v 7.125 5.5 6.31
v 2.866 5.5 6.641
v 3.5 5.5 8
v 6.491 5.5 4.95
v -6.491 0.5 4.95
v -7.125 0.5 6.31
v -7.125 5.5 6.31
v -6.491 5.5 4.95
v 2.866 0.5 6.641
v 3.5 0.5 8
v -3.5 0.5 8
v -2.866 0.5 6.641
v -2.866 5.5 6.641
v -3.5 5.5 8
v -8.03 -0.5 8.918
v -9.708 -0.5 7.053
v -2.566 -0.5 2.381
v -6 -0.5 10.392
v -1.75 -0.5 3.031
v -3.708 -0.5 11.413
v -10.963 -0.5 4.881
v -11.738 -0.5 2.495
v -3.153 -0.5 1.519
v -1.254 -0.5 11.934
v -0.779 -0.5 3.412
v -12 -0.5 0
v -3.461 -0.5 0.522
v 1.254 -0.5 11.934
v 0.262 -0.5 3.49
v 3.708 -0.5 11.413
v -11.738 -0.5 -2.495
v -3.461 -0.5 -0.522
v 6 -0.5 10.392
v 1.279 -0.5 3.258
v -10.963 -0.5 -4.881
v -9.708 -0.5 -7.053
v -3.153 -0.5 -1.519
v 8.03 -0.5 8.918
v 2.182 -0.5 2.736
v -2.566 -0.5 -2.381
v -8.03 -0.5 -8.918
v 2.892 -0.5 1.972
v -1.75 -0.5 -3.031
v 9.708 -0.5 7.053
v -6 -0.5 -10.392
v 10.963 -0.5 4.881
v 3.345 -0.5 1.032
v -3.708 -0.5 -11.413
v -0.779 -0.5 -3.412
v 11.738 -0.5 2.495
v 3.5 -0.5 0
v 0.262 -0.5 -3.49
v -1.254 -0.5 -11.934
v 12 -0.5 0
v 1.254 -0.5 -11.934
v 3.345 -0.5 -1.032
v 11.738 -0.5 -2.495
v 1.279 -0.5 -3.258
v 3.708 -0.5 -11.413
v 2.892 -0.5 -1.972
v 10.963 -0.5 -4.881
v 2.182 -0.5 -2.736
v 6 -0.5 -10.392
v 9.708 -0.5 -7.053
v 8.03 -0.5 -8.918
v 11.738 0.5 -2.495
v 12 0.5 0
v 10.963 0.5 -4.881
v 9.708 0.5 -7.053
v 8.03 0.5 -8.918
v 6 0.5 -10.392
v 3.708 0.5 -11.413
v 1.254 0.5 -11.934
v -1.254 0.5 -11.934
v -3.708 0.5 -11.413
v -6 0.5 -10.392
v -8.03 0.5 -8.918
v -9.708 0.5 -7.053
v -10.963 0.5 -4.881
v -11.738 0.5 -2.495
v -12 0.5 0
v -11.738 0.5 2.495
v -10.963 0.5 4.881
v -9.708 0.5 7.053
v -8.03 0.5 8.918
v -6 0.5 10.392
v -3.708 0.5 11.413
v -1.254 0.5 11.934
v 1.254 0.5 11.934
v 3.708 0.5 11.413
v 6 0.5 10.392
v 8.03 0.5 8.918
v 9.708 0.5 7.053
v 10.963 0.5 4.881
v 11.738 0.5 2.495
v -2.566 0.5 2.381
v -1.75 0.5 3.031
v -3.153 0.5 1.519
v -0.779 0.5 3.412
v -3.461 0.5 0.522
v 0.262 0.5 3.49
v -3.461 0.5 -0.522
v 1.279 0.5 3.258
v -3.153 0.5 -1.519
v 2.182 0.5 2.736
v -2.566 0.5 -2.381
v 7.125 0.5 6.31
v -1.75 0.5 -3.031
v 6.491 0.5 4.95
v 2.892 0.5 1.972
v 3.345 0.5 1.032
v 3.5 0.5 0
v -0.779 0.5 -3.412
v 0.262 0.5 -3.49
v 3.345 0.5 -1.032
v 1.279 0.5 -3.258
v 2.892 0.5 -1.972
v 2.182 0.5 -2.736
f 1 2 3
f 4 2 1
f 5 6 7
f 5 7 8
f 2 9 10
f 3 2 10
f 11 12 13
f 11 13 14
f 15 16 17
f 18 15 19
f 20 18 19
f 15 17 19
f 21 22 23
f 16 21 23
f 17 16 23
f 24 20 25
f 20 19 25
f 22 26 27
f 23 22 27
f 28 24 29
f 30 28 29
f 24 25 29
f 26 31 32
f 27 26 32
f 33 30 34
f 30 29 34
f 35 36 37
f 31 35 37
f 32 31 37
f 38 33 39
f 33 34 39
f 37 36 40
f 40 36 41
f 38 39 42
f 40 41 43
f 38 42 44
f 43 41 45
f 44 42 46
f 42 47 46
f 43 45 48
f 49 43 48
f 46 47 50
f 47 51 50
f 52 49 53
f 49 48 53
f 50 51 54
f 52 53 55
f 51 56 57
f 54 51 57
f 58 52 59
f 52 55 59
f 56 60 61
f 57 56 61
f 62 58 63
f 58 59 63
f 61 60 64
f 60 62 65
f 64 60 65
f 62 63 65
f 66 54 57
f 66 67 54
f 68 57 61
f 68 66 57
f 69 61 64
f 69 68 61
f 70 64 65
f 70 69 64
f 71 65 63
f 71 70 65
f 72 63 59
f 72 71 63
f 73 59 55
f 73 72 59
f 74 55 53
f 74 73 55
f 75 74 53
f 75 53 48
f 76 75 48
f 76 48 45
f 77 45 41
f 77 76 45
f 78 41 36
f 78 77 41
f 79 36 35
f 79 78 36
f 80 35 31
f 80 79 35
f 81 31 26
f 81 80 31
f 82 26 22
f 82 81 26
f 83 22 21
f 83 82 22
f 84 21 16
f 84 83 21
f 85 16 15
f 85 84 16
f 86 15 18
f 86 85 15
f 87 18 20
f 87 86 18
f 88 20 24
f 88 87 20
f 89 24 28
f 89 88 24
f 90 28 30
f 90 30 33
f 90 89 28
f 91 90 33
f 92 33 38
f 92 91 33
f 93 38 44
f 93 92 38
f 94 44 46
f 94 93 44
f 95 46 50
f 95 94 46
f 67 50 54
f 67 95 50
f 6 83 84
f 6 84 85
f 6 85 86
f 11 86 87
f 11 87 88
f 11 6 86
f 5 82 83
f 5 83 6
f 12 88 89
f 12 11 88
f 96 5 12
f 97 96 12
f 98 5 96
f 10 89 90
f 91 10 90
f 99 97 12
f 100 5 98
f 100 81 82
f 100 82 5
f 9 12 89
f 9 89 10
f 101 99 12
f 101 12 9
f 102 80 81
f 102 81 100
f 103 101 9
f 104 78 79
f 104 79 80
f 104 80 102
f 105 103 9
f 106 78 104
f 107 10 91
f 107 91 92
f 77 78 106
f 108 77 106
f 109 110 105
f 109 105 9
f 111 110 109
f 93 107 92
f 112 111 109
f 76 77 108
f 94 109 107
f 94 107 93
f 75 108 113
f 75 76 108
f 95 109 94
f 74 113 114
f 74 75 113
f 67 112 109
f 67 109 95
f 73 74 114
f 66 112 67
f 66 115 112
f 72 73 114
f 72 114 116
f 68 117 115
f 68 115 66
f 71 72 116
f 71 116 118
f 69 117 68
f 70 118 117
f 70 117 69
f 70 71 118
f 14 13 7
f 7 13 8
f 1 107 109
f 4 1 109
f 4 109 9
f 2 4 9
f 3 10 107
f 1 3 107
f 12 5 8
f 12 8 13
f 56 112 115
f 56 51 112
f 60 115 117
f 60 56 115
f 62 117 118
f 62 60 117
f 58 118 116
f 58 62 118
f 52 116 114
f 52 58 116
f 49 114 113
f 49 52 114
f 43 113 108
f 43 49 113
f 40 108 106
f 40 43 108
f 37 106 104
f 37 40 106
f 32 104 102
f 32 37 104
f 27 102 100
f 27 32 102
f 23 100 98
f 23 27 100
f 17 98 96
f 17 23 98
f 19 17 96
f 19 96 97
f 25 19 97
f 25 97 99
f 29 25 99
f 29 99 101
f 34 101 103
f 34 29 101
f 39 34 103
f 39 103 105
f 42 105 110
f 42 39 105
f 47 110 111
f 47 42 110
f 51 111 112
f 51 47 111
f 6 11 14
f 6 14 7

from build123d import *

# Parameters (mm, degrees)
SKETCH1_R           = 12
SKETCH1_R_2         = 3.5
BOSS_EXTRUDE1_DEPTH = 0.5
BOSS_EXTRUDE3_DEPTH = 5


with BuildPart() as part:
    # Sketch1 → Boss-Extrude1 (new body, symmetric)
    with BuildSketch(Plane(origin=(0, 0, 0), x_dir=(1, 0, 0), z_dir=(0, 1, 0))):
        Circle(SKETCH1_R)
        Circle(SKETCH1_R_2, mode=Mode.SUBTRACT)
    extrude(amount=BOSS_EXTRUDE1_DEPTH, both=True)

    # Sketch5 → Boss-Extrude3 (add)
    with BuildSketch(Plane(origin=(0, 0.5, 0), x_dir=(1, 0, 0), z_dir=(0, 1, 0))):
        Polygon((-6.491303756, -4.950065272), (-2.866072607, -6.640538319), (-3.5, -8), (-7.125231148, -6.309526953), align=None)
        Polygon((7.125231148, -6.309526953), (6.491303756, -4.950065272), (2.866072607, -6.640538319), (3.5, -8), align=None)
    extrude(amount=BOSS_EXTRUDE3_DEPTH)


solid = part.part
